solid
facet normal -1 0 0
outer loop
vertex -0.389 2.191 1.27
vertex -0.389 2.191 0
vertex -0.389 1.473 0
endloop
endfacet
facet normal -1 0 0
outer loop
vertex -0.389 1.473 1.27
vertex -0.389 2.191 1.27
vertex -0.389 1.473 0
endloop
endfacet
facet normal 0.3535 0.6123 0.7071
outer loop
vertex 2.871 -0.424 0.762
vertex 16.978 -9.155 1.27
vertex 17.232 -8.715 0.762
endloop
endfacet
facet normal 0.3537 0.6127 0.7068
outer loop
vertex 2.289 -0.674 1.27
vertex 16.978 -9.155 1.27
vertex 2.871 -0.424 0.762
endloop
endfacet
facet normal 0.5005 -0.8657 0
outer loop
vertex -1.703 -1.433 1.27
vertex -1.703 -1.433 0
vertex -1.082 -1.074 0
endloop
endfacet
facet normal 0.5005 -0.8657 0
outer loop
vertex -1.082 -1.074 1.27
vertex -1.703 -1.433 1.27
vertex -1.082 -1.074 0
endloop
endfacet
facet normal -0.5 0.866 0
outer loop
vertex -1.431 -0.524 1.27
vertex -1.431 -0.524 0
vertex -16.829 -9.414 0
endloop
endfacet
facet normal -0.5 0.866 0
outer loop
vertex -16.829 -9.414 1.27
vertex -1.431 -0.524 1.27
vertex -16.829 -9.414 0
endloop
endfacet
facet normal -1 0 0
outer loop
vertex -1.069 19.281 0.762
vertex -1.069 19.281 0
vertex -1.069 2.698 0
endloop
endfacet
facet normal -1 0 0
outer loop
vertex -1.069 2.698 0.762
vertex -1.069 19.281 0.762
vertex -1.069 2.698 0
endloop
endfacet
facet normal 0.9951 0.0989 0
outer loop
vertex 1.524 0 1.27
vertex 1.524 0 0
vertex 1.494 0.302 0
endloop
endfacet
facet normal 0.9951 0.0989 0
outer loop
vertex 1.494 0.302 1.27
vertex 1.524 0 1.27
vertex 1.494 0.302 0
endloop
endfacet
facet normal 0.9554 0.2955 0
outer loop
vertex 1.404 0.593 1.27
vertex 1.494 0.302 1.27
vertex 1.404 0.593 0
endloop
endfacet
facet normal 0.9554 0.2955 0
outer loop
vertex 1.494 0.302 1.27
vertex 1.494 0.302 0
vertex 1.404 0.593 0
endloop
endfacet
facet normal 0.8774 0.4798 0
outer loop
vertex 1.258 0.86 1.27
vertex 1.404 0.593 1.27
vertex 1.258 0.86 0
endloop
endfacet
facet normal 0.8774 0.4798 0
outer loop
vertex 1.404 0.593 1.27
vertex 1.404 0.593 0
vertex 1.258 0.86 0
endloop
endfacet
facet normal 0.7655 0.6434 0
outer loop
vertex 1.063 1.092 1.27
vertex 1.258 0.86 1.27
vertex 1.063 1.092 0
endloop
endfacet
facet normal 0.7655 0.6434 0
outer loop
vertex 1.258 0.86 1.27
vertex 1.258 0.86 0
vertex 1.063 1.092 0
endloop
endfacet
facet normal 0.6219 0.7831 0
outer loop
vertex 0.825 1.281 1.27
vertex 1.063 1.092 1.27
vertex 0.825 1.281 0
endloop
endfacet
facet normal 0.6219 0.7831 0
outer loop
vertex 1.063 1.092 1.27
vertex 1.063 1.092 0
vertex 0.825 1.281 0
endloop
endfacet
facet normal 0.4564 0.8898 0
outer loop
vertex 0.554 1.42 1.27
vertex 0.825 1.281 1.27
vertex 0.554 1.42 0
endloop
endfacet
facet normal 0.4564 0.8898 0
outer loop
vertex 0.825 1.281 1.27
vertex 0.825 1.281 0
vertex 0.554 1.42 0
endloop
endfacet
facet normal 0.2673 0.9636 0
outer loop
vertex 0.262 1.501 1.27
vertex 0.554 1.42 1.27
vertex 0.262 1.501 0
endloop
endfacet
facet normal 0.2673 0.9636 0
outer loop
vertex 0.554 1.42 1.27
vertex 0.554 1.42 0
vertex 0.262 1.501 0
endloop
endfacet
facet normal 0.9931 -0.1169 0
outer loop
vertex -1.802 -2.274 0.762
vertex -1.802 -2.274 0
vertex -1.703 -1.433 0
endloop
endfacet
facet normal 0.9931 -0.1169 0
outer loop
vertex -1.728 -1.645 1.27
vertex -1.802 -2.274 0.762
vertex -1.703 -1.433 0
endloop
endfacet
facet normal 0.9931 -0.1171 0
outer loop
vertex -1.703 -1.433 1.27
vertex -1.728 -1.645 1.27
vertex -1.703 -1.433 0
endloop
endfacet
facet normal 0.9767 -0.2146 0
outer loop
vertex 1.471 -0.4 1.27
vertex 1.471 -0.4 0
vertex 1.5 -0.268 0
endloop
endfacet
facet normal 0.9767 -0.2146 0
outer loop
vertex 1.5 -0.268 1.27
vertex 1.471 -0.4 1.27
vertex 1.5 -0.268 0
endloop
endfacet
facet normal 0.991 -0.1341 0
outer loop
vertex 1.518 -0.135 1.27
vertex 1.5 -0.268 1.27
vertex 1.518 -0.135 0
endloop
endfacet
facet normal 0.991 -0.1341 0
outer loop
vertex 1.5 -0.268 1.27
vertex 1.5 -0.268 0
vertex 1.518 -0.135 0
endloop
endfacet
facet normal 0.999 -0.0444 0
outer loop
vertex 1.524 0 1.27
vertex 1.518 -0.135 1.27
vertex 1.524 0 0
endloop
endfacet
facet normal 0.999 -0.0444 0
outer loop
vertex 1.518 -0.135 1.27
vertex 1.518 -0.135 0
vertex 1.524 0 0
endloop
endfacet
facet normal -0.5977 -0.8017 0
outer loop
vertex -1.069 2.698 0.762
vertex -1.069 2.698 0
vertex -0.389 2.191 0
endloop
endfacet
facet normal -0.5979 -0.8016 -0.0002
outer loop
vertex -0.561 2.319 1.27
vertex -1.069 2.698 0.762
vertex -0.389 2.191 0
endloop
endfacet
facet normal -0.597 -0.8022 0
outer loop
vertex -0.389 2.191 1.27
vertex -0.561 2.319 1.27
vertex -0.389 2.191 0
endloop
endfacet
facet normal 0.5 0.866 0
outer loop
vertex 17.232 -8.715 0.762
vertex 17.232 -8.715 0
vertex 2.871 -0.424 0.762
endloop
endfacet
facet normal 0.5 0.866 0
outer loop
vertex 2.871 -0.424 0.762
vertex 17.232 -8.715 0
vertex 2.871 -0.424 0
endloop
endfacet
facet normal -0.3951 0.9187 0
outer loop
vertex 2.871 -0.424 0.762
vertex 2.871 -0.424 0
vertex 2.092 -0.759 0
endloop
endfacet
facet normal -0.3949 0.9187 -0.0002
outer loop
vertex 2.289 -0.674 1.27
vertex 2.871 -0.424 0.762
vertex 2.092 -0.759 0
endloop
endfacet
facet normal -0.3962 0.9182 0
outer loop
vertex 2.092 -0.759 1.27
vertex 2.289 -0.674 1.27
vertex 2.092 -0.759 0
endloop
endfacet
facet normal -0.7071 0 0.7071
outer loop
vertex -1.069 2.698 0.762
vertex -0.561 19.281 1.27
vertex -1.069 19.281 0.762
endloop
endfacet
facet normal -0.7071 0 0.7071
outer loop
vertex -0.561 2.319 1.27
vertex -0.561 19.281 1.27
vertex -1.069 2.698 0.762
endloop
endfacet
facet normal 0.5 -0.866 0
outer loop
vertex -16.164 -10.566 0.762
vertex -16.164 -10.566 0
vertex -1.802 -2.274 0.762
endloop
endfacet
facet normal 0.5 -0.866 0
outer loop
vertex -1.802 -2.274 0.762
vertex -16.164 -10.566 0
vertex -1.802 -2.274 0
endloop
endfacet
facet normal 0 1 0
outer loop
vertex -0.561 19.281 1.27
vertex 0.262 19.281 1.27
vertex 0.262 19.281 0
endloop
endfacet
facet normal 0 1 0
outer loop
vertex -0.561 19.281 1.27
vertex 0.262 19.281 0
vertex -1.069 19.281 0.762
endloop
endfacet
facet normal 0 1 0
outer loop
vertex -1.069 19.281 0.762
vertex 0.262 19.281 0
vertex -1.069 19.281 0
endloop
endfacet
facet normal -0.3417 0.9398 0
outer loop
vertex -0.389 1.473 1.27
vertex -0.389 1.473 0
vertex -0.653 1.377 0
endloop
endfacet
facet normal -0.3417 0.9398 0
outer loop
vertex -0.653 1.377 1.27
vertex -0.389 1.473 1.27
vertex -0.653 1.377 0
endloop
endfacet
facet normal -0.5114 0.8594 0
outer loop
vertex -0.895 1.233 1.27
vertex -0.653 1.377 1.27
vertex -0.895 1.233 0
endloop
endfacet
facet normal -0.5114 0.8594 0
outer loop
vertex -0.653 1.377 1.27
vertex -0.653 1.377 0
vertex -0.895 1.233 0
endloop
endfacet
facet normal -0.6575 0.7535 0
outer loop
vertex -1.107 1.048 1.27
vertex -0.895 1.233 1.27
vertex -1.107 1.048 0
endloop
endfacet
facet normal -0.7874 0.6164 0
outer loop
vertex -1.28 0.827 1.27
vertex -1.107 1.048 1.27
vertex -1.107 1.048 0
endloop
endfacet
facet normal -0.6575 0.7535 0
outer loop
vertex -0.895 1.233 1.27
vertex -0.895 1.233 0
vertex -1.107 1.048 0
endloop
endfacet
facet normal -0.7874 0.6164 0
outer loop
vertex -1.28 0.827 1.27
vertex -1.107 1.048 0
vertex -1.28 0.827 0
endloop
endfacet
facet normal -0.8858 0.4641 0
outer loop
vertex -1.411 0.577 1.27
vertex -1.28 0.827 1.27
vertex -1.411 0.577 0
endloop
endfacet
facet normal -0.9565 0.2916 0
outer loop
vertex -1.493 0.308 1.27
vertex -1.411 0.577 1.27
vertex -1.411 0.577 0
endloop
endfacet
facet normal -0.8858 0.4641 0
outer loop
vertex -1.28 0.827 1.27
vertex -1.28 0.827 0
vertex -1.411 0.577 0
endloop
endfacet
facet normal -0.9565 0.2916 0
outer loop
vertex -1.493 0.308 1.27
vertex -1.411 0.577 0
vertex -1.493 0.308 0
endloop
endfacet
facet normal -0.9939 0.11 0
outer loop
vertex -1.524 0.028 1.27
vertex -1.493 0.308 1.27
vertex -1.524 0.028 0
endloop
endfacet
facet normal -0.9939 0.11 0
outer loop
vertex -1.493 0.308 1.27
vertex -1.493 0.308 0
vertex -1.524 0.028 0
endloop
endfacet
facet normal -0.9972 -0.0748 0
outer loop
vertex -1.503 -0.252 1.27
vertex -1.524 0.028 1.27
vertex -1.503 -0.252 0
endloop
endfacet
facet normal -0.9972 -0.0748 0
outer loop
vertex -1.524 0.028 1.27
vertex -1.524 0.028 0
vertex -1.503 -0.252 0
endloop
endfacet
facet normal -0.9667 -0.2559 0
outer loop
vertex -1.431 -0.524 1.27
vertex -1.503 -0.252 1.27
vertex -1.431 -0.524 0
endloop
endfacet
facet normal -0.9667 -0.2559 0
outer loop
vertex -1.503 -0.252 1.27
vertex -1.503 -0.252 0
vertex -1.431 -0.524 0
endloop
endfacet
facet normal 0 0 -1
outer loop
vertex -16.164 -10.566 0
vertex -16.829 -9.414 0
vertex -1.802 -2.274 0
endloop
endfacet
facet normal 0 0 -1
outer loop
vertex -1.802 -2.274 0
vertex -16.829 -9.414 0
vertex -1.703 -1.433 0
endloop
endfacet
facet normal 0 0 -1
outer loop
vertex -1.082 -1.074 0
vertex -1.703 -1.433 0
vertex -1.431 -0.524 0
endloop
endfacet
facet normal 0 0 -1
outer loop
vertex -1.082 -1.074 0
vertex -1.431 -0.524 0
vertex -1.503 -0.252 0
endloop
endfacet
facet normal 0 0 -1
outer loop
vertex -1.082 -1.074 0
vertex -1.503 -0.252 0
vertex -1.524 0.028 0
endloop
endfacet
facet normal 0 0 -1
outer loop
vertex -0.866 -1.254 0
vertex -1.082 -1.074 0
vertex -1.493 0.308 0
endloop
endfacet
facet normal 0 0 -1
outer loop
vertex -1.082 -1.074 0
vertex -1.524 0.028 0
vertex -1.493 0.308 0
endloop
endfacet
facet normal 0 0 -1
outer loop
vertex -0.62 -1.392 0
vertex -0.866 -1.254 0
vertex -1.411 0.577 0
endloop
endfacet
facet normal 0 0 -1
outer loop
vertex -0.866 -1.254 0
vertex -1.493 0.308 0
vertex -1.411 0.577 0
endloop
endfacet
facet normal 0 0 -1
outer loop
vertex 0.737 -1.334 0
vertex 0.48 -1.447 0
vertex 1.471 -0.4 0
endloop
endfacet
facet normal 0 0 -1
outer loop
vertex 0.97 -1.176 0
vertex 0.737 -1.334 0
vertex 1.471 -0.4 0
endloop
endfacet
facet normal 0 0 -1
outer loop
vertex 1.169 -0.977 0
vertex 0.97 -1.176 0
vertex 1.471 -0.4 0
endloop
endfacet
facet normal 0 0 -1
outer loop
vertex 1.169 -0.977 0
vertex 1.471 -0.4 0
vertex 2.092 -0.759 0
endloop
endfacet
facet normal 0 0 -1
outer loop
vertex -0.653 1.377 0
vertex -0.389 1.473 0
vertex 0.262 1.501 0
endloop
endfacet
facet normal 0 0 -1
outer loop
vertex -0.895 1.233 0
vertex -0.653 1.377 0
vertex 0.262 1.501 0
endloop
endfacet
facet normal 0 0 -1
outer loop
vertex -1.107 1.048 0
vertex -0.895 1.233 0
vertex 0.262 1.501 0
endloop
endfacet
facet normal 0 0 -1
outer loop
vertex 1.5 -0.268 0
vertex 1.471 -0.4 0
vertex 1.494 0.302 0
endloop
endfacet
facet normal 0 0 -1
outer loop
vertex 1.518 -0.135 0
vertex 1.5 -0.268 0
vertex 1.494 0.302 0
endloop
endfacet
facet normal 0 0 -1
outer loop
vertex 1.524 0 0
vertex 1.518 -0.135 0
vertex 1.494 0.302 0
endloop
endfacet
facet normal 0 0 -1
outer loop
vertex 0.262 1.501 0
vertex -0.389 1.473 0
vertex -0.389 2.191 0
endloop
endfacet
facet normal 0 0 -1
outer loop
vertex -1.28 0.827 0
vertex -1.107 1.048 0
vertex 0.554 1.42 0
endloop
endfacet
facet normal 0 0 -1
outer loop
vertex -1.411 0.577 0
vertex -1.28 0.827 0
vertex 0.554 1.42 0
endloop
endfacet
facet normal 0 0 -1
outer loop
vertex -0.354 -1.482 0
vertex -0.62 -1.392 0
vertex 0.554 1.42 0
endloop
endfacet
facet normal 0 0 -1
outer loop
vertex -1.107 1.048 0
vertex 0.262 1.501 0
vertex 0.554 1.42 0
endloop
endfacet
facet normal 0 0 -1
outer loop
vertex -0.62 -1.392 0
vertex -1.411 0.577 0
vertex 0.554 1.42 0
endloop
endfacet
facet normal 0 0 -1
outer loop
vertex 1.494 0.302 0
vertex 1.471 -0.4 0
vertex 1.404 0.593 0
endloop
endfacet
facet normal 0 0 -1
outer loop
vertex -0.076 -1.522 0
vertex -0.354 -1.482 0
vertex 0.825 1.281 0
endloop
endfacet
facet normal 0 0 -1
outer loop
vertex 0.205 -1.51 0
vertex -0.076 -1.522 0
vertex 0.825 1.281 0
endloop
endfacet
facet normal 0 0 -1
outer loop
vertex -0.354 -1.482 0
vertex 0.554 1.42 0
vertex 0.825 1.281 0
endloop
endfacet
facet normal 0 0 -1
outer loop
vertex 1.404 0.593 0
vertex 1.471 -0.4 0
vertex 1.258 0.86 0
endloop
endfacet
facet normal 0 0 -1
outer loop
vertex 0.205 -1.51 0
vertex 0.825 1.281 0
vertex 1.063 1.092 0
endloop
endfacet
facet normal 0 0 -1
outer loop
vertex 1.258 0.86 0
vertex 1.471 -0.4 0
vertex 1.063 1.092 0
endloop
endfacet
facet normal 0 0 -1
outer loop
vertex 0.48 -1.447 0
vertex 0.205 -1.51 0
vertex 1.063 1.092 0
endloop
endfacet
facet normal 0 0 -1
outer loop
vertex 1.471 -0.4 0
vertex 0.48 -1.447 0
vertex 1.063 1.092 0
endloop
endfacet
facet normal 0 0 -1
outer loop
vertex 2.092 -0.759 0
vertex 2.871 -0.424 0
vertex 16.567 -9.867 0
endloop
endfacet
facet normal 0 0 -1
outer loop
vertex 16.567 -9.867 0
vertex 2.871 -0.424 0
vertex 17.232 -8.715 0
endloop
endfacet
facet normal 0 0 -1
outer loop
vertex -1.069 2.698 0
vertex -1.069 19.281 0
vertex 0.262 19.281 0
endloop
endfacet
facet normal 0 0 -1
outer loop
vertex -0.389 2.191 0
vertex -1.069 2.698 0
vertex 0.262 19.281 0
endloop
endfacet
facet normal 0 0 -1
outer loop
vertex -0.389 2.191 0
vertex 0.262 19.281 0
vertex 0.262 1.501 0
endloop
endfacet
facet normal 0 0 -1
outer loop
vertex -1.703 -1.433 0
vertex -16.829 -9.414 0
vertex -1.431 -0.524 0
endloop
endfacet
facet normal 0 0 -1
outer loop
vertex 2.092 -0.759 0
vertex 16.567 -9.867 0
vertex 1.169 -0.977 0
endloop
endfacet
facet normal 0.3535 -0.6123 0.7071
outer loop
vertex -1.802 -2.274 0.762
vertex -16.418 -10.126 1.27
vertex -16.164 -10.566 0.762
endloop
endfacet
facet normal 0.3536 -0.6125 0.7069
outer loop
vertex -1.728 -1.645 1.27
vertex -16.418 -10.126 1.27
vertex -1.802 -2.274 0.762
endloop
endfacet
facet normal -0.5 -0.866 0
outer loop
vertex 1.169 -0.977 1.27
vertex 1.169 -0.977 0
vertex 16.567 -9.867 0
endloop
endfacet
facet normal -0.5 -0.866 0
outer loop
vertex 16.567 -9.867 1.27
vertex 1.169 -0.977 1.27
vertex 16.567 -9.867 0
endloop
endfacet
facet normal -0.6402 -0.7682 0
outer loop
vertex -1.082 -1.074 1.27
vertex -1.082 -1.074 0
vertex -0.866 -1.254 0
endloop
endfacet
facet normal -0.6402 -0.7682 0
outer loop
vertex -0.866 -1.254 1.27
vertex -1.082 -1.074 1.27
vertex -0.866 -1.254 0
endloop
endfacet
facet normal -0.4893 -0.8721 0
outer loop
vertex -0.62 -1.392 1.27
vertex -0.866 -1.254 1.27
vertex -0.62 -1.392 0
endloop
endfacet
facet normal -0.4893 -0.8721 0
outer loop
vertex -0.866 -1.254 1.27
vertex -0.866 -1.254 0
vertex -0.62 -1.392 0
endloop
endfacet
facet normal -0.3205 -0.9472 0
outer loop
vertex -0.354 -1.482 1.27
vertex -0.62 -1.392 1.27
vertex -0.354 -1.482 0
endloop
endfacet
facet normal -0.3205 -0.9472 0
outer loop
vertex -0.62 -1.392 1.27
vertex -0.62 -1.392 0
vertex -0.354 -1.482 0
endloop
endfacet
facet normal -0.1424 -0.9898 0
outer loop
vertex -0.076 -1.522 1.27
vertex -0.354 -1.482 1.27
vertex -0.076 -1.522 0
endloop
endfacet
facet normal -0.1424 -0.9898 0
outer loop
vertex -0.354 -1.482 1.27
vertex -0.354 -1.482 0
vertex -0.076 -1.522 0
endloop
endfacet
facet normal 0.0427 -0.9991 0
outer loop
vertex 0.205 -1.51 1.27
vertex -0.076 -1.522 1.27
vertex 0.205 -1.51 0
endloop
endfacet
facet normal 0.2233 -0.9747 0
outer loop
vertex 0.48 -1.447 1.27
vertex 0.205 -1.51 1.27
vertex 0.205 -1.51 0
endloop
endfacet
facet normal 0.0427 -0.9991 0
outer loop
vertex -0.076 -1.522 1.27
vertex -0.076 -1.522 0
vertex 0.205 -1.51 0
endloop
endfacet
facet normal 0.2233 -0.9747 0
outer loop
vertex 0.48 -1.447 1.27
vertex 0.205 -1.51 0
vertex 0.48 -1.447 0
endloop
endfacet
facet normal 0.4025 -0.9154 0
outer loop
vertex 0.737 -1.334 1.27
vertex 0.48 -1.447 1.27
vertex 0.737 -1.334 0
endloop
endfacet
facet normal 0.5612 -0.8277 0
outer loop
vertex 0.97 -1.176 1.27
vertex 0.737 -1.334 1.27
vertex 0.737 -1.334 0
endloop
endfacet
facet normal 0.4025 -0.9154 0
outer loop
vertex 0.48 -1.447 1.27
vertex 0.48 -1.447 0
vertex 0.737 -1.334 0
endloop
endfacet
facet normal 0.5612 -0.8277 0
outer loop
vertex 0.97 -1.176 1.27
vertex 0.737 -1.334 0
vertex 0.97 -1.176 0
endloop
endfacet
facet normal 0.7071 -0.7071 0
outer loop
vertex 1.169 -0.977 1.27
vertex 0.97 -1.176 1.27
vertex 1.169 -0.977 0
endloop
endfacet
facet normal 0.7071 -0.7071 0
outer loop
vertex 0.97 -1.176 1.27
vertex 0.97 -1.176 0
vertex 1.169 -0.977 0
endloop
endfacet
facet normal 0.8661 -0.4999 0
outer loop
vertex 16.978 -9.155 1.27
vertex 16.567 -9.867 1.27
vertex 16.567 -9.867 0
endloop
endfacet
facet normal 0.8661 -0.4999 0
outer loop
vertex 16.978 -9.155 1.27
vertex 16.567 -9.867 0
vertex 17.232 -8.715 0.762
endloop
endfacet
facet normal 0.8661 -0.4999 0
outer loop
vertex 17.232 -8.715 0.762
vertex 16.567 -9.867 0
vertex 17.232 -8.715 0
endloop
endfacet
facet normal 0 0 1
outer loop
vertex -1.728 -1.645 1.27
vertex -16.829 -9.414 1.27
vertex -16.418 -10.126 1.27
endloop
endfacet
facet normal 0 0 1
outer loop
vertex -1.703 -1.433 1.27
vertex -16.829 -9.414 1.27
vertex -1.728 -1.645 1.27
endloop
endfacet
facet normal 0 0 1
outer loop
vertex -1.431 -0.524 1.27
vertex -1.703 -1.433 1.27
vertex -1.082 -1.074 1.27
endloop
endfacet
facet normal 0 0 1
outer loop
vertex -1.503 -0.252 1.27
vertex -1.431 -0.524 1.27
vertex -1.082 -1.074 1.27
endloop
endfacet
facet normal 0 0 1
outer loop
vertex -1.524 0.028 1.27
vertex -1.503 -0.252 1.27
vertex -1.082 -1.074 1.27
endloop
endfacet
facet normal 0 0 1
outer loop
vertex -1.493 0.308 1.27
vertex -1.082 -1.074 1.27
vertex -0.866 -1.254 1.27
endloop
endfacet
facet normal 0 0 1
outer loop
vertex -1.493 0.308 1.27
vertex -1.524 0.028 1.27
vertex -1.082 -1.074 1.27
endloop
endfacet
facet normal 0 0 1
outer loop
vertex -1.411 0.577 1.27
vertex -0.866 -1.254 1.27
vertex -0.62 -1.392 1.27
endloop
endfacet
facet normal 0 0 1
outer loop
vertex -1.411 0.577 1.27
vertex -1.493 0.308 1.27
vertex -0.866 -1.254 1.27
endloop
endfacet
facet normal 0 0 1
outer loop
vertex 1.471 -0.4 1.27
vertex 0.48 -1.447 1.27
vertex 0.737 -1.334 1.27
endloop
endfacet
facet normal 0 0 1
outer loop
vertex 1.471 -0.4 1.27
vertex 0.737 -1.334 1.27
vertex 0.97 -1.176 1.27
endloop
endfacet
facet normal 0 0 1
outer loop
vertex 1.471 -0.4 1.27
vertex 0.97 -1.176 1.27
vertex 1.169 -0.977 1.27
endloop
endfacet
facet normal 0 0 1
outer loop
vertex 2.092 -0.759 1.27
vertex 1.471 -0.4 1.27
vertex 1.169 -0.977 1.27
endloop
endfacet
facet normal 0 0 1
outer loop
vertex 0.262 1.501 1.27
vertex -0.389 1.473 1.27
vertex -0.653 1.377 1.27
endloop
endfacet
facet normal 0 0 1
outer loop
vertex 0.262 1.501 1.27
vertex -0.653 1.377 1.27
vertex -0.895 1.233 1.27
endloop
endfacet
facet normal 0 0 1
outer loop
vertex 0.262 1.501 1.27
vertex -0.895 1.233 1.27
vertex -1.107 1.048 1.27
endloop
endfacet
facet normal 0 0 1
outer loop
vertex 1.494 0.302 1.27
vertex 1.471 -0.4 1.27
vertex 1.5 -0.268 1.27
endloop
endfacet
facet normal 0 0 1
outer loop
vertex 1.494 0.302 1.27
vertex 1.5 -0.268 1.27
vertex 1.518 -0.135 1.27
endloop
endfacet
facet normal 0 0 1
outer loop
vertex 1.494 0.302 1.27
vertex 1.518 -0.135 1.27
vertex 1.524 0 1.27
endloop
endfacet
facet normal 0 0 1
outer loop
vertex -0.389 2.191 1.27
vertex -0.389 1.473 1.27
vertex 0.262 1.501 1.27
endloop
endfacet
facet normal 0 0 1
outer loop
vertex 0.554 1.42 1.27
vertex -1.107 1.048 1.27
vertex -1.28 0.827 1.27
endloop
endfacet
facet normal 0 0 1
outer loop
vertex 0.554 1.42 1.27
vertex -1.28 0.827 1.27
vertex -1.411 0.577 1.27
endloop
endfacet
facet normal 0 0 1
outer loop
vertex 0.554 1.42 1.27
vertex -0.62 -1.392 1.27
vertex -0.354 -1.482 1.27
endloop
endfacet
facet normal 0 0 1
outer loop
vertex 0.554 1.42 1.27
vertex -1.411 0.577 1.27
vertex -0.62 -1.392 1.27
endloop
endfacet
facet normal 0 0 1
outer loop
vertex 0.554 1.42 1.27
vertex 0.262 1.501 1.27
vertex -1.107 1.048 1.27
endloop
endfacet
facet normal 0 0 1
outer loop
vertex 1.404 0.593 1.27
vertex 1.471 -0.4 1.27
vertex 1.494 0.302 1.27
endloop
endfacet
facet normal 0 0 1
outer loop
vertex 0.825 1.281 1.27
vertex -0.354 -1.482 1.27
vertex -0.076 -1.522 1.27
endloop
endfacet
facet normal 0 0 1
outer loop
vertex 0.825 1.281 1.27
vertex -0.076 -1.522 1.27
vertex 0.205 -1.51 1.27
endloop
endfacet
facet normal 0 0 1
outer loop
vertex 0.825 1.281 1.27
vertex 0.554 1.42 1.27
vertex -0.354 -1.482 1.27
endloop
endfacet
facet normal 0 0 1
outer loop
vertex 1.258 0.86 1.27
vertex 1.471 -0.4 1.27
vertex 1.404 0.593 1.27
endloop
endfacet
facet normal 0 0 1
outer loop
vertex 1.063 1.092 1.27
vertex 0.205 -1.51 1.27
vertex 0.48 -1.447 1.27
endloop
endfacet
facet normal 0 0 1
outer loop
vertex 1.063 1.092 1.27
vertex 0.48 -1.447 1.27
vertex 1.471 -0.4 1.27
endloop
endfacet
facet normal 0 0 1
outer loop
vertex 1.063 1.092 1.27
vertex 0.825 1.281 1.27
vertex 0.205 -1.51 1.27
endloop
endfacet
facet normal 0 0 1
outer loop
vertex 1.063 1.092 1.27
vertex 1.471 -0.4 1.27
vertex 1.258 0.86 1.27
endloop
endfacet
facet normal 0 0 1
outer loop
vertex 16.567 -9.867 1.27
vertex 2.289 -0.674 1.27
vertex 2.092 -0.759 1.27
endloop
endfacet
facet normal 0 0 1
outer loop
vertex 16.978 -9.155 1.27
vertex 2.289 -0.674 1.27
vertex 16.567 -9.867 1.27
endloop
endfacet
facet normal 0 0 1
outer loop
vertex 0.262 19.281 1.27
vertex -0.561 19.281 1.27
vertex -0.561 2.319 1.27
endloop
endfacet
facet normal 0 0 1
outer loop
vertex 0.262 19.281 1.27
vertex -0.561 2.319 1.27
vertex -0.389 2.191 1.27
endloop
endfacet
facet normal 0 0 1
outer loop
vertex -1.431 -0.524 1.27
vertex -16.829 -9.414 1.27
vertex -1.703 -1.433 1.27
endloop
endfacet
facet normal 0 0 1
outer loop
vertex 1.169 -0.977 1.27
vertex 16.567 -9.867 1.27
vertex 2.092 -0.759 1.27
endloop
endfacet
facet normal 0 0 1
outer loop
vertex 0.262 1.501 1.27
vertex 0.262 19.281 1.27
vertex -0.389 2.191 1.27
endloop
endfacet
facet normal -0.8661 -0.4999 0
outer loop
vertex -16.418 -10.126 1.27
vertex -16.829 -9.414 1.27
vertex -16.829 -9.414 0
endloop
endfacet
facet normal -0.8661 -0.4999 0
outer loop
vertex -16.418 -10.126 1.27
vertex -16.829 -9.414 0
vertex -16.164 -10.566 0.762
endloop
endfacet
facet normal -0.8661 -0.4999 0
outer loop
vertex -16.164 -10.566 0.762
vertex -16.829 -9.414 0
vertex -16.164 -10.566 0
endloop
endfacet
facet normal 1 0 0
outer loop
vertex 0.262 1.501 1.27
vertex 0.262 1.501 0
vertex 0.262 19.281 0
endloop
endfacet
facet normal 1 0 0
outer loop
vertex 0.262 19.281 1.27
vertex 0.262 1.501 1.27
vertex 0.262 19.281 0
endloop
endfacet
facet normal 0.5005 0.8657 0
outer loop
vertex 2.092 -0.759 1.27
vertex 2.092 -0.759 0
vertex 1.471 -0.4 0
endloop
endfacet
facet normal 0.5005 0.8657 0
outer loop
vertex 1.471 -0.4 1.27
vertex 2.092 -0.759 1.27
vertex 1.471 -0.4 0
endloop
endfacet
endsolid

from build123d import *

# Parameters (mm, degrees)
F1_DEPTH = 1.27
F2_SIZE  = 0.508


with BuildPart() as f1:
    # F0 (on Top) → F1 (new body)
    with BuildSketch(Plane.XY):
        with BuildLine():
            ThreePointArc((1.470624, -0.3998), (1.510597, -0.201674), (1.524, 0))
            ThreePointArc((1.524, 0), (1.166482, 0.980762), (0.261671, 1.501367))
            ThreePointArc((0.261671, 1.501367), (-0.065208, 1.522604), (-0.389075, 1.473498))
            ThreePointArc((-0.389075, 1.473498), (-1.351218, 0.70483), (-1.431058, -0.52407))
            ThreePointArc((-1.431058, -0.52407), (-1.28601, -0.817774), (-1.081549, -1.073698))
            ThreePointArc((-1.081549, -1.073698), (0.065208, -1.522604), (1.169387, -0.977297))
            ThreePointArc((1.169387, -0.977297), (1.351218, -0.70483), (1.470624, -0.3998))
        make_face()
        with BuildLine():
            ThreePointArc((-0.389075, 1.473498), (-0.065208, 1.522604), (0.261671, 1.501367))
            Line((0.261671, 1.501367), (0.261671, 19.281367))
            Line((0.261671, 19.281367), (-1.068548, 19.281367))
            Line((-1.068548, 19.281367), (-1.068548, 2.698131))
            Line((-1.068548, 2.698131), (-0.389075, 2.191366))
            Line((-0.389075, 2.191366), (-0.389075, 1.473498))
        make_face()
        with BuildLine():
            Line((2.092316, -0.758734), (1.470624, -0.3998))
            ThreePointArc((1.470624, -0.3998), (1.351218, -0.70483), (1.169387, -0.977297))
            Line((1.169387, -0.977297), (16.567319, -9.867297))
            Line((16.567319, -9.867297), (17.232428, -8.715294))
            Line((17.232428, -8.715294), (2.870924, -0.423675))
            Line((2.870924, -0.423675), (2.092316, -0.758734))
        make_face()
        with BuildLine():
            ThreePointArc((-1.081549, -1.073698), (-1.28601, -0.817774), (-1.431058, -0.52407))
            Line((-1.431058, -0.52407), (-16.82899, -9.41407))
            Line((-16.82899, -9.41407), (-16.16388, -10.566074))
            Line((-16.16388, -10.566074), (-1.802376, -2.274455))
            Line((-1.802376, -2.274455), (-1.703241, -1.432632))
            Line((-1.703241, -1.432632), (-1.081549, -1.073698))
        make_face()
    extrude(amount=F1_DEPTH)

    # F2
    f2_edges = [f1.edges().sort_by_distance(p)[0] for p in [
        (-1.068548, 10.989749, 1.27),
        (-8.983128, -6.420265, 1.27),
        (10.051676, -4.569485, 1.27),
    ]]
    chamfer(f2_edges, length=F2_SIZE)


solid = f1.part
